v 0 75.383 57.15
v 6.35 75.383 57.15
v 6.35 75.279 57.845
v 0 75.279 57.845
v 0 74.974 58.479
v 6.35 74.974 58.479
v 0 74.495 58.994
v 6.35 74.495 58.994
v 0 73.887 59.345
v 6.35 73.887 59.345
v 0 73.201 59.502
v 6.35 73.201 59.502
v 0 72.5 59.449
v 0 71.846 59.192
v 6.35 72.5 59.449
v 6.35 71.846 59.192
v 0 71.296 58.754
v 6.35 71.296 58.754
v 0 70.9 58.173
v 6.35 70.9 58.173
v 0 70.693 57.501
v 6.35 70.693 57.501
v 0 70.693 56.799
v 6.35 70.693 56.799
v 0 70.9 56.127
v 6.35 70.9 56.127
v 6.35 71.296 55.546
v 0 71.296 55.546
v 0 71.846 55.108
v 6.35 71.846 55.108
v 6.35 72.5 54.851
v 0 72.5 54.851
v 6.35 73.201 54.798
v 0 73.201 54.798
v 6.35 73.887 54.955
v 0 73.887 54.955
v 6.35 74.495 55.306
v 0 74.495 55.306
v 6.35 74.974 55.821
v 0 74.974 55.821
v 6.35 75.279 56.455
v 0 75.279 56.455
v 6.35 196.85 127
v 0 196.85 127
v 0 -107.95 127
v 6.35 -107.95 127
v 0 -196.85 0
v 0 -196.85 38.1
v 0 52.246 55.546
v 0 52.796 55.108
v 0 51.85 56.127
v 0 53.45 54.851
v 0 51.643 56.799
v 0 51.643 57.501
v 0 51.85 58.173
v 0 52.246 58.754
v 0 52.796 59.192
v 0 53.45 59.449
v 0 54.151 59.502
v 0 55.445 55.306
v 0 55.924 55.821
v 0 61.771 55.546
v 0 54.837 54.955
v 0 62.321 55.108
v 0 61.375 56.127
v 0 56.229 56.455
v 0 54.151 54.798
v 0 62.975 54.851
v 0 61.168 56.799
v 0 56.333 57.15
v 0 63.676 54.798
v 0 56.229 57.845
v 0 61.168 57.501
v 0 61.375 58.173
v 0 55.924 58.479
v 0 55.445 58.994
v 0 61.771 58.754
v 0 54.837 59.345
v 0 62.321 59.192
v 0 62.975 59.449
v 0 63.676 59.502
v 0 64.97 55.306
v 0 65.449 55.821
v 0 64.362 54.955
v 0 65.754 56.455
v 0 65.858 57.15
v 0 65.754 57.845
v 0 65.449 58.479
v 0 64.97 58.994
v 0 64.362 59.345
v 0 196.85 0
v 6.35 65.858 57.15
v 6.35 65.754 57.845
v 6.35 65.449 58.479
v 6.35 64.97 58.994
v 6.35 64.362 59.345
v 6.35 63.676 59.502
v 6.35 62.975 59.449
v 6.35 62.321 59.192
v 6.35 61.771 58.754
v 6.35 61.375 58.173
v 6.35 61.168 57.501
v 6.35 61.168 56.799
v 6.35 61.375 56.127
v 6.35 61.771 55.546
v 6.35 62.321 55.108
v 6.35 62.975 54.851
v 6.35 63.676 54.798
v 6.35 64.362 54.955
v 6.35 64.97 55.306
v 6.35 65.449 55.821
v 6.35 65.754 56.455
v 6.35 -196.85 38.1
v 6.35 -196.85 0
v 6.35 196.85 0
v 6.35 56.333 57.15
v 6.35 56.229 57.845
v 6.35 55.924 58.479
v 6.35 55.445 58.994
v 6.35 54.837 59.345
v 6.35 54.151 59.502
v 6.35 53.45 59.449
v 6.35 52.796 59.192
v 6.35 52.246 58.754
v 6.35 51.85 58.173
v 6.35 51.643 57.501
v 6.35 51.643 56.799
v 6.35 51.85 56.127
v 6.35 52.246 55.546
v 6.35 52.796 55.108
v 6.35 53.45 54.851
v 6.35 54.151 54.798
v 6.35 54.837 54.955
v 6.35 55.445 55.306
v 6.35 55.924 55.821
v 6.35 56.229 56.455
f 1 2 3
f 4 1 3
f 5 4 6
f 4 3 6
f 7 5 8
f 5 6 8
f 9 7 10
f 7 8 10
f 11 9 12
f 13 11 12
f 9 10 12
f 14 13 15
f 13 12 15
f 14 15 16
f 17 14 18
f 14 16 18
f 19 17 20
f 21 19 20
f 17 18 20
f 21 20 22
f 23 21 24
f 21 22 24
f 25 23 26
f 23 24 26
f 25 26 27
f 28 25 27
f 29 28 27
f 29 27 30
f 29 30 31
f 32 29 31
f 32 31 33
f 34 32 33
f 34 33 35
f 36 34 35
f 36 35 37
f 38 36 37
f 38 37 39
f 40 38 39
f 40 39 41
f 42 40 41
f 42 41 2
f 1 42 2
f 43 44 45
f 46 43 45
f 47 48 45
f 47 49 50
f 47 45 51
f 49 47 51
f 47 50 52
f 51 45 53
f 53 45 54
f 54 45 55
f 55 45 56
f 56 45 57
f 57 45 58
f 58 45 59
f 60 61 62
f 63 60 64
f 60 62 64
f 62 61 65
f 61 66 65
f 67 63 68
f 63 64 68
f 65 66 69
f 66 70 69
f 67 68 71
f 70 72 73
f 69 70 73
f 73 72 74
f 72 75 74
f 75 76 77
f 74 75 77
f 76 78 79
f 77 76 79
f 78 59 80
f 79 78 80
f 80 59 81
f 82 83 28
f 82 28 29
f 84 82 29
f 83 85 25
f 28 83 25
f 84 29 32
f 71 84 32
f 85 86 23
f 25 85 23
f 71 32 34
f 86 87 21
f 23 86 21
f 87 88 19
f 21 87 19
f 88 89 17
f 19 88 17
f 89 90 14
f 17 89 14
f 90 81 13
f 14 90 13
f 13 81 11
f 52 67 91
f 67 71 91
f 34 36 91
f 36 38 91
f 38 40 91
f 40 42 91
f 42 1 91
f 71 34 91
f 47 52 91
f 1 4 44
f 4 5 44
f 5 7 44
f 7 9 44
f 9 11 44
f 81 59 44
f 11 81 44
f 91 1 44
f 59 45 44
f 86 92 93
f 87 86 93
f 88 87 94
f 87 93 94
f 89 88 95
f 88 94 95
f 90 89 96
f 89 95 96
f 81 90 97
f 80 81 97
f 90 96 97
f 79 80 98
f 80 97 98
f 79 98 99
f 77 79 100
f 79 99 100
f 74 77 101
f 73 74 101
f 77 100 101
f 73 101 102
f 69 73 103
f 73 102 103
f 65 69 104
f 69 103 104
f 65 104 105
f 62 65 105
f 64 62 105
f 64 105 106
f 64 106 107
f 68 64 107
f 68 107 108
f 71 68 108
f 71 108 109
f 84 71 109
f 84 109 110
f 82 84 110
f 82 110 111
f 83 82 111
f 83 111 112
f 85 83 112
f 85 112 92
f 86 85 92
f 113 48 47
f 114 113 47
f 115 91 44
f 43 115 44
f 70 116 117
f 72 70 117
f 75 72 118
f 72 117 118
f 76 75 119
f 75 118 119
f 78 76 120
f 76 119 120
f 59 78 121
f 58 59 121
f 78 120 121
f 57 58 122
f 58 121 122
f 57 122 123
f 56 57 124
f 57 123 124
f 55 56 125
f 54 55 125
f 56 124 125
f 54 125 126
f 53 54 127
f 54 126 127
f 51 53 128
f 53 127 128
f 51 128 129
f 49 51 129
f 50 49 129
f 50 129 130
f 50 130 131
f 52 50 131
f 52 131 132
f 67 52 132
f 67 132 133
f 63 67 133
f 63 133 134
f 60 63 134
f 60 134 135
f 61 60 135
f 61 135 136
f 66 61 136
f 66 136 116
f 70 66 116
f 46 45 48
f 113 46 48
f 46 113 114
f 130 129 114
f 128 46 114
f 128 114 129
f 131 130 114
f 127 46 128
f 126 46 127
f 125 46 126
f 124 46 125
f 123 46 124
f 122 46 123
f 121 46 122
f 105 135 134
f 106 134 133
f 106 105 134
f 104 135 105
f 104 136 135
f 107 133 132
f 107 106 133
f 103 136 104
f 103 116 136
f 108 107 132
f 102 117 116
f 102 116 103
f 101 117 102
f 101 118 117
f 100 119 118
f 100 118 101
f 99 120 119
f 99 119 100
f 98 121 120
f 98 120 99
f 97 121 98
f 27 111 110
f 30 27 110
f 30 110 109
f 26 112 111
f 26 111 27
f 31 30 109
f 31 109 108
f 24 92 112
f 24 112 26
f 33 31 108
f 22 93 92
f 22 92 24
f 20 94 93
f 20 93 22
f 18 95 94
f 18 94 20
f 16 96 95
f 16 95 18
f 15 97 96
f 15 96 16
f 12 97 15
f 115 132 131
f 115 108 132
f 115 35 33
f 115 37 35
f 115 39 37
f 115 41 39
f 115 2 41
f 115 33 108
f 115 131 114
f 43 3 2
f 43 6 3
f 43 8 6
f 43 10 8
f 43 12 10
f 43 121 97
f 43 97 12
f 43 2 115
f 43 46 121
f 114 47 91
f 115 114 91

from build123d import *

# Parameters (mm, degrees)
F1_DEPTH = 6.35
F2_R     = 2.35839
F3_DEPTH = 6.351


with BuildPart() as f1:
    # F0 (on Right) → F1 (new body)
    with BuildSketch(Plane.YZ):
        Polygon((-196.85, 38.1), (-196.85, 0), (196.85, 0), (196.85, 127), (-107.95, 127), align=None)
    extrude(amount=F1_DEPTH)

    # F2 (on face) → F3 (cut, through all)
    with BuildSketch(Plane.YZ.offset(6.35)):
        with Locations((53.975, 57.15)):
            Circle(F2_R)
        with Locations((63.5, 57.15)):
            Circle(F2_R)
        with Locations((73.025, 57.15)):
            Circle(F2_R)
    extrude(amount=-F3_DEPTH, mode=Mode.SUBTRACT)


solid = f1.part
